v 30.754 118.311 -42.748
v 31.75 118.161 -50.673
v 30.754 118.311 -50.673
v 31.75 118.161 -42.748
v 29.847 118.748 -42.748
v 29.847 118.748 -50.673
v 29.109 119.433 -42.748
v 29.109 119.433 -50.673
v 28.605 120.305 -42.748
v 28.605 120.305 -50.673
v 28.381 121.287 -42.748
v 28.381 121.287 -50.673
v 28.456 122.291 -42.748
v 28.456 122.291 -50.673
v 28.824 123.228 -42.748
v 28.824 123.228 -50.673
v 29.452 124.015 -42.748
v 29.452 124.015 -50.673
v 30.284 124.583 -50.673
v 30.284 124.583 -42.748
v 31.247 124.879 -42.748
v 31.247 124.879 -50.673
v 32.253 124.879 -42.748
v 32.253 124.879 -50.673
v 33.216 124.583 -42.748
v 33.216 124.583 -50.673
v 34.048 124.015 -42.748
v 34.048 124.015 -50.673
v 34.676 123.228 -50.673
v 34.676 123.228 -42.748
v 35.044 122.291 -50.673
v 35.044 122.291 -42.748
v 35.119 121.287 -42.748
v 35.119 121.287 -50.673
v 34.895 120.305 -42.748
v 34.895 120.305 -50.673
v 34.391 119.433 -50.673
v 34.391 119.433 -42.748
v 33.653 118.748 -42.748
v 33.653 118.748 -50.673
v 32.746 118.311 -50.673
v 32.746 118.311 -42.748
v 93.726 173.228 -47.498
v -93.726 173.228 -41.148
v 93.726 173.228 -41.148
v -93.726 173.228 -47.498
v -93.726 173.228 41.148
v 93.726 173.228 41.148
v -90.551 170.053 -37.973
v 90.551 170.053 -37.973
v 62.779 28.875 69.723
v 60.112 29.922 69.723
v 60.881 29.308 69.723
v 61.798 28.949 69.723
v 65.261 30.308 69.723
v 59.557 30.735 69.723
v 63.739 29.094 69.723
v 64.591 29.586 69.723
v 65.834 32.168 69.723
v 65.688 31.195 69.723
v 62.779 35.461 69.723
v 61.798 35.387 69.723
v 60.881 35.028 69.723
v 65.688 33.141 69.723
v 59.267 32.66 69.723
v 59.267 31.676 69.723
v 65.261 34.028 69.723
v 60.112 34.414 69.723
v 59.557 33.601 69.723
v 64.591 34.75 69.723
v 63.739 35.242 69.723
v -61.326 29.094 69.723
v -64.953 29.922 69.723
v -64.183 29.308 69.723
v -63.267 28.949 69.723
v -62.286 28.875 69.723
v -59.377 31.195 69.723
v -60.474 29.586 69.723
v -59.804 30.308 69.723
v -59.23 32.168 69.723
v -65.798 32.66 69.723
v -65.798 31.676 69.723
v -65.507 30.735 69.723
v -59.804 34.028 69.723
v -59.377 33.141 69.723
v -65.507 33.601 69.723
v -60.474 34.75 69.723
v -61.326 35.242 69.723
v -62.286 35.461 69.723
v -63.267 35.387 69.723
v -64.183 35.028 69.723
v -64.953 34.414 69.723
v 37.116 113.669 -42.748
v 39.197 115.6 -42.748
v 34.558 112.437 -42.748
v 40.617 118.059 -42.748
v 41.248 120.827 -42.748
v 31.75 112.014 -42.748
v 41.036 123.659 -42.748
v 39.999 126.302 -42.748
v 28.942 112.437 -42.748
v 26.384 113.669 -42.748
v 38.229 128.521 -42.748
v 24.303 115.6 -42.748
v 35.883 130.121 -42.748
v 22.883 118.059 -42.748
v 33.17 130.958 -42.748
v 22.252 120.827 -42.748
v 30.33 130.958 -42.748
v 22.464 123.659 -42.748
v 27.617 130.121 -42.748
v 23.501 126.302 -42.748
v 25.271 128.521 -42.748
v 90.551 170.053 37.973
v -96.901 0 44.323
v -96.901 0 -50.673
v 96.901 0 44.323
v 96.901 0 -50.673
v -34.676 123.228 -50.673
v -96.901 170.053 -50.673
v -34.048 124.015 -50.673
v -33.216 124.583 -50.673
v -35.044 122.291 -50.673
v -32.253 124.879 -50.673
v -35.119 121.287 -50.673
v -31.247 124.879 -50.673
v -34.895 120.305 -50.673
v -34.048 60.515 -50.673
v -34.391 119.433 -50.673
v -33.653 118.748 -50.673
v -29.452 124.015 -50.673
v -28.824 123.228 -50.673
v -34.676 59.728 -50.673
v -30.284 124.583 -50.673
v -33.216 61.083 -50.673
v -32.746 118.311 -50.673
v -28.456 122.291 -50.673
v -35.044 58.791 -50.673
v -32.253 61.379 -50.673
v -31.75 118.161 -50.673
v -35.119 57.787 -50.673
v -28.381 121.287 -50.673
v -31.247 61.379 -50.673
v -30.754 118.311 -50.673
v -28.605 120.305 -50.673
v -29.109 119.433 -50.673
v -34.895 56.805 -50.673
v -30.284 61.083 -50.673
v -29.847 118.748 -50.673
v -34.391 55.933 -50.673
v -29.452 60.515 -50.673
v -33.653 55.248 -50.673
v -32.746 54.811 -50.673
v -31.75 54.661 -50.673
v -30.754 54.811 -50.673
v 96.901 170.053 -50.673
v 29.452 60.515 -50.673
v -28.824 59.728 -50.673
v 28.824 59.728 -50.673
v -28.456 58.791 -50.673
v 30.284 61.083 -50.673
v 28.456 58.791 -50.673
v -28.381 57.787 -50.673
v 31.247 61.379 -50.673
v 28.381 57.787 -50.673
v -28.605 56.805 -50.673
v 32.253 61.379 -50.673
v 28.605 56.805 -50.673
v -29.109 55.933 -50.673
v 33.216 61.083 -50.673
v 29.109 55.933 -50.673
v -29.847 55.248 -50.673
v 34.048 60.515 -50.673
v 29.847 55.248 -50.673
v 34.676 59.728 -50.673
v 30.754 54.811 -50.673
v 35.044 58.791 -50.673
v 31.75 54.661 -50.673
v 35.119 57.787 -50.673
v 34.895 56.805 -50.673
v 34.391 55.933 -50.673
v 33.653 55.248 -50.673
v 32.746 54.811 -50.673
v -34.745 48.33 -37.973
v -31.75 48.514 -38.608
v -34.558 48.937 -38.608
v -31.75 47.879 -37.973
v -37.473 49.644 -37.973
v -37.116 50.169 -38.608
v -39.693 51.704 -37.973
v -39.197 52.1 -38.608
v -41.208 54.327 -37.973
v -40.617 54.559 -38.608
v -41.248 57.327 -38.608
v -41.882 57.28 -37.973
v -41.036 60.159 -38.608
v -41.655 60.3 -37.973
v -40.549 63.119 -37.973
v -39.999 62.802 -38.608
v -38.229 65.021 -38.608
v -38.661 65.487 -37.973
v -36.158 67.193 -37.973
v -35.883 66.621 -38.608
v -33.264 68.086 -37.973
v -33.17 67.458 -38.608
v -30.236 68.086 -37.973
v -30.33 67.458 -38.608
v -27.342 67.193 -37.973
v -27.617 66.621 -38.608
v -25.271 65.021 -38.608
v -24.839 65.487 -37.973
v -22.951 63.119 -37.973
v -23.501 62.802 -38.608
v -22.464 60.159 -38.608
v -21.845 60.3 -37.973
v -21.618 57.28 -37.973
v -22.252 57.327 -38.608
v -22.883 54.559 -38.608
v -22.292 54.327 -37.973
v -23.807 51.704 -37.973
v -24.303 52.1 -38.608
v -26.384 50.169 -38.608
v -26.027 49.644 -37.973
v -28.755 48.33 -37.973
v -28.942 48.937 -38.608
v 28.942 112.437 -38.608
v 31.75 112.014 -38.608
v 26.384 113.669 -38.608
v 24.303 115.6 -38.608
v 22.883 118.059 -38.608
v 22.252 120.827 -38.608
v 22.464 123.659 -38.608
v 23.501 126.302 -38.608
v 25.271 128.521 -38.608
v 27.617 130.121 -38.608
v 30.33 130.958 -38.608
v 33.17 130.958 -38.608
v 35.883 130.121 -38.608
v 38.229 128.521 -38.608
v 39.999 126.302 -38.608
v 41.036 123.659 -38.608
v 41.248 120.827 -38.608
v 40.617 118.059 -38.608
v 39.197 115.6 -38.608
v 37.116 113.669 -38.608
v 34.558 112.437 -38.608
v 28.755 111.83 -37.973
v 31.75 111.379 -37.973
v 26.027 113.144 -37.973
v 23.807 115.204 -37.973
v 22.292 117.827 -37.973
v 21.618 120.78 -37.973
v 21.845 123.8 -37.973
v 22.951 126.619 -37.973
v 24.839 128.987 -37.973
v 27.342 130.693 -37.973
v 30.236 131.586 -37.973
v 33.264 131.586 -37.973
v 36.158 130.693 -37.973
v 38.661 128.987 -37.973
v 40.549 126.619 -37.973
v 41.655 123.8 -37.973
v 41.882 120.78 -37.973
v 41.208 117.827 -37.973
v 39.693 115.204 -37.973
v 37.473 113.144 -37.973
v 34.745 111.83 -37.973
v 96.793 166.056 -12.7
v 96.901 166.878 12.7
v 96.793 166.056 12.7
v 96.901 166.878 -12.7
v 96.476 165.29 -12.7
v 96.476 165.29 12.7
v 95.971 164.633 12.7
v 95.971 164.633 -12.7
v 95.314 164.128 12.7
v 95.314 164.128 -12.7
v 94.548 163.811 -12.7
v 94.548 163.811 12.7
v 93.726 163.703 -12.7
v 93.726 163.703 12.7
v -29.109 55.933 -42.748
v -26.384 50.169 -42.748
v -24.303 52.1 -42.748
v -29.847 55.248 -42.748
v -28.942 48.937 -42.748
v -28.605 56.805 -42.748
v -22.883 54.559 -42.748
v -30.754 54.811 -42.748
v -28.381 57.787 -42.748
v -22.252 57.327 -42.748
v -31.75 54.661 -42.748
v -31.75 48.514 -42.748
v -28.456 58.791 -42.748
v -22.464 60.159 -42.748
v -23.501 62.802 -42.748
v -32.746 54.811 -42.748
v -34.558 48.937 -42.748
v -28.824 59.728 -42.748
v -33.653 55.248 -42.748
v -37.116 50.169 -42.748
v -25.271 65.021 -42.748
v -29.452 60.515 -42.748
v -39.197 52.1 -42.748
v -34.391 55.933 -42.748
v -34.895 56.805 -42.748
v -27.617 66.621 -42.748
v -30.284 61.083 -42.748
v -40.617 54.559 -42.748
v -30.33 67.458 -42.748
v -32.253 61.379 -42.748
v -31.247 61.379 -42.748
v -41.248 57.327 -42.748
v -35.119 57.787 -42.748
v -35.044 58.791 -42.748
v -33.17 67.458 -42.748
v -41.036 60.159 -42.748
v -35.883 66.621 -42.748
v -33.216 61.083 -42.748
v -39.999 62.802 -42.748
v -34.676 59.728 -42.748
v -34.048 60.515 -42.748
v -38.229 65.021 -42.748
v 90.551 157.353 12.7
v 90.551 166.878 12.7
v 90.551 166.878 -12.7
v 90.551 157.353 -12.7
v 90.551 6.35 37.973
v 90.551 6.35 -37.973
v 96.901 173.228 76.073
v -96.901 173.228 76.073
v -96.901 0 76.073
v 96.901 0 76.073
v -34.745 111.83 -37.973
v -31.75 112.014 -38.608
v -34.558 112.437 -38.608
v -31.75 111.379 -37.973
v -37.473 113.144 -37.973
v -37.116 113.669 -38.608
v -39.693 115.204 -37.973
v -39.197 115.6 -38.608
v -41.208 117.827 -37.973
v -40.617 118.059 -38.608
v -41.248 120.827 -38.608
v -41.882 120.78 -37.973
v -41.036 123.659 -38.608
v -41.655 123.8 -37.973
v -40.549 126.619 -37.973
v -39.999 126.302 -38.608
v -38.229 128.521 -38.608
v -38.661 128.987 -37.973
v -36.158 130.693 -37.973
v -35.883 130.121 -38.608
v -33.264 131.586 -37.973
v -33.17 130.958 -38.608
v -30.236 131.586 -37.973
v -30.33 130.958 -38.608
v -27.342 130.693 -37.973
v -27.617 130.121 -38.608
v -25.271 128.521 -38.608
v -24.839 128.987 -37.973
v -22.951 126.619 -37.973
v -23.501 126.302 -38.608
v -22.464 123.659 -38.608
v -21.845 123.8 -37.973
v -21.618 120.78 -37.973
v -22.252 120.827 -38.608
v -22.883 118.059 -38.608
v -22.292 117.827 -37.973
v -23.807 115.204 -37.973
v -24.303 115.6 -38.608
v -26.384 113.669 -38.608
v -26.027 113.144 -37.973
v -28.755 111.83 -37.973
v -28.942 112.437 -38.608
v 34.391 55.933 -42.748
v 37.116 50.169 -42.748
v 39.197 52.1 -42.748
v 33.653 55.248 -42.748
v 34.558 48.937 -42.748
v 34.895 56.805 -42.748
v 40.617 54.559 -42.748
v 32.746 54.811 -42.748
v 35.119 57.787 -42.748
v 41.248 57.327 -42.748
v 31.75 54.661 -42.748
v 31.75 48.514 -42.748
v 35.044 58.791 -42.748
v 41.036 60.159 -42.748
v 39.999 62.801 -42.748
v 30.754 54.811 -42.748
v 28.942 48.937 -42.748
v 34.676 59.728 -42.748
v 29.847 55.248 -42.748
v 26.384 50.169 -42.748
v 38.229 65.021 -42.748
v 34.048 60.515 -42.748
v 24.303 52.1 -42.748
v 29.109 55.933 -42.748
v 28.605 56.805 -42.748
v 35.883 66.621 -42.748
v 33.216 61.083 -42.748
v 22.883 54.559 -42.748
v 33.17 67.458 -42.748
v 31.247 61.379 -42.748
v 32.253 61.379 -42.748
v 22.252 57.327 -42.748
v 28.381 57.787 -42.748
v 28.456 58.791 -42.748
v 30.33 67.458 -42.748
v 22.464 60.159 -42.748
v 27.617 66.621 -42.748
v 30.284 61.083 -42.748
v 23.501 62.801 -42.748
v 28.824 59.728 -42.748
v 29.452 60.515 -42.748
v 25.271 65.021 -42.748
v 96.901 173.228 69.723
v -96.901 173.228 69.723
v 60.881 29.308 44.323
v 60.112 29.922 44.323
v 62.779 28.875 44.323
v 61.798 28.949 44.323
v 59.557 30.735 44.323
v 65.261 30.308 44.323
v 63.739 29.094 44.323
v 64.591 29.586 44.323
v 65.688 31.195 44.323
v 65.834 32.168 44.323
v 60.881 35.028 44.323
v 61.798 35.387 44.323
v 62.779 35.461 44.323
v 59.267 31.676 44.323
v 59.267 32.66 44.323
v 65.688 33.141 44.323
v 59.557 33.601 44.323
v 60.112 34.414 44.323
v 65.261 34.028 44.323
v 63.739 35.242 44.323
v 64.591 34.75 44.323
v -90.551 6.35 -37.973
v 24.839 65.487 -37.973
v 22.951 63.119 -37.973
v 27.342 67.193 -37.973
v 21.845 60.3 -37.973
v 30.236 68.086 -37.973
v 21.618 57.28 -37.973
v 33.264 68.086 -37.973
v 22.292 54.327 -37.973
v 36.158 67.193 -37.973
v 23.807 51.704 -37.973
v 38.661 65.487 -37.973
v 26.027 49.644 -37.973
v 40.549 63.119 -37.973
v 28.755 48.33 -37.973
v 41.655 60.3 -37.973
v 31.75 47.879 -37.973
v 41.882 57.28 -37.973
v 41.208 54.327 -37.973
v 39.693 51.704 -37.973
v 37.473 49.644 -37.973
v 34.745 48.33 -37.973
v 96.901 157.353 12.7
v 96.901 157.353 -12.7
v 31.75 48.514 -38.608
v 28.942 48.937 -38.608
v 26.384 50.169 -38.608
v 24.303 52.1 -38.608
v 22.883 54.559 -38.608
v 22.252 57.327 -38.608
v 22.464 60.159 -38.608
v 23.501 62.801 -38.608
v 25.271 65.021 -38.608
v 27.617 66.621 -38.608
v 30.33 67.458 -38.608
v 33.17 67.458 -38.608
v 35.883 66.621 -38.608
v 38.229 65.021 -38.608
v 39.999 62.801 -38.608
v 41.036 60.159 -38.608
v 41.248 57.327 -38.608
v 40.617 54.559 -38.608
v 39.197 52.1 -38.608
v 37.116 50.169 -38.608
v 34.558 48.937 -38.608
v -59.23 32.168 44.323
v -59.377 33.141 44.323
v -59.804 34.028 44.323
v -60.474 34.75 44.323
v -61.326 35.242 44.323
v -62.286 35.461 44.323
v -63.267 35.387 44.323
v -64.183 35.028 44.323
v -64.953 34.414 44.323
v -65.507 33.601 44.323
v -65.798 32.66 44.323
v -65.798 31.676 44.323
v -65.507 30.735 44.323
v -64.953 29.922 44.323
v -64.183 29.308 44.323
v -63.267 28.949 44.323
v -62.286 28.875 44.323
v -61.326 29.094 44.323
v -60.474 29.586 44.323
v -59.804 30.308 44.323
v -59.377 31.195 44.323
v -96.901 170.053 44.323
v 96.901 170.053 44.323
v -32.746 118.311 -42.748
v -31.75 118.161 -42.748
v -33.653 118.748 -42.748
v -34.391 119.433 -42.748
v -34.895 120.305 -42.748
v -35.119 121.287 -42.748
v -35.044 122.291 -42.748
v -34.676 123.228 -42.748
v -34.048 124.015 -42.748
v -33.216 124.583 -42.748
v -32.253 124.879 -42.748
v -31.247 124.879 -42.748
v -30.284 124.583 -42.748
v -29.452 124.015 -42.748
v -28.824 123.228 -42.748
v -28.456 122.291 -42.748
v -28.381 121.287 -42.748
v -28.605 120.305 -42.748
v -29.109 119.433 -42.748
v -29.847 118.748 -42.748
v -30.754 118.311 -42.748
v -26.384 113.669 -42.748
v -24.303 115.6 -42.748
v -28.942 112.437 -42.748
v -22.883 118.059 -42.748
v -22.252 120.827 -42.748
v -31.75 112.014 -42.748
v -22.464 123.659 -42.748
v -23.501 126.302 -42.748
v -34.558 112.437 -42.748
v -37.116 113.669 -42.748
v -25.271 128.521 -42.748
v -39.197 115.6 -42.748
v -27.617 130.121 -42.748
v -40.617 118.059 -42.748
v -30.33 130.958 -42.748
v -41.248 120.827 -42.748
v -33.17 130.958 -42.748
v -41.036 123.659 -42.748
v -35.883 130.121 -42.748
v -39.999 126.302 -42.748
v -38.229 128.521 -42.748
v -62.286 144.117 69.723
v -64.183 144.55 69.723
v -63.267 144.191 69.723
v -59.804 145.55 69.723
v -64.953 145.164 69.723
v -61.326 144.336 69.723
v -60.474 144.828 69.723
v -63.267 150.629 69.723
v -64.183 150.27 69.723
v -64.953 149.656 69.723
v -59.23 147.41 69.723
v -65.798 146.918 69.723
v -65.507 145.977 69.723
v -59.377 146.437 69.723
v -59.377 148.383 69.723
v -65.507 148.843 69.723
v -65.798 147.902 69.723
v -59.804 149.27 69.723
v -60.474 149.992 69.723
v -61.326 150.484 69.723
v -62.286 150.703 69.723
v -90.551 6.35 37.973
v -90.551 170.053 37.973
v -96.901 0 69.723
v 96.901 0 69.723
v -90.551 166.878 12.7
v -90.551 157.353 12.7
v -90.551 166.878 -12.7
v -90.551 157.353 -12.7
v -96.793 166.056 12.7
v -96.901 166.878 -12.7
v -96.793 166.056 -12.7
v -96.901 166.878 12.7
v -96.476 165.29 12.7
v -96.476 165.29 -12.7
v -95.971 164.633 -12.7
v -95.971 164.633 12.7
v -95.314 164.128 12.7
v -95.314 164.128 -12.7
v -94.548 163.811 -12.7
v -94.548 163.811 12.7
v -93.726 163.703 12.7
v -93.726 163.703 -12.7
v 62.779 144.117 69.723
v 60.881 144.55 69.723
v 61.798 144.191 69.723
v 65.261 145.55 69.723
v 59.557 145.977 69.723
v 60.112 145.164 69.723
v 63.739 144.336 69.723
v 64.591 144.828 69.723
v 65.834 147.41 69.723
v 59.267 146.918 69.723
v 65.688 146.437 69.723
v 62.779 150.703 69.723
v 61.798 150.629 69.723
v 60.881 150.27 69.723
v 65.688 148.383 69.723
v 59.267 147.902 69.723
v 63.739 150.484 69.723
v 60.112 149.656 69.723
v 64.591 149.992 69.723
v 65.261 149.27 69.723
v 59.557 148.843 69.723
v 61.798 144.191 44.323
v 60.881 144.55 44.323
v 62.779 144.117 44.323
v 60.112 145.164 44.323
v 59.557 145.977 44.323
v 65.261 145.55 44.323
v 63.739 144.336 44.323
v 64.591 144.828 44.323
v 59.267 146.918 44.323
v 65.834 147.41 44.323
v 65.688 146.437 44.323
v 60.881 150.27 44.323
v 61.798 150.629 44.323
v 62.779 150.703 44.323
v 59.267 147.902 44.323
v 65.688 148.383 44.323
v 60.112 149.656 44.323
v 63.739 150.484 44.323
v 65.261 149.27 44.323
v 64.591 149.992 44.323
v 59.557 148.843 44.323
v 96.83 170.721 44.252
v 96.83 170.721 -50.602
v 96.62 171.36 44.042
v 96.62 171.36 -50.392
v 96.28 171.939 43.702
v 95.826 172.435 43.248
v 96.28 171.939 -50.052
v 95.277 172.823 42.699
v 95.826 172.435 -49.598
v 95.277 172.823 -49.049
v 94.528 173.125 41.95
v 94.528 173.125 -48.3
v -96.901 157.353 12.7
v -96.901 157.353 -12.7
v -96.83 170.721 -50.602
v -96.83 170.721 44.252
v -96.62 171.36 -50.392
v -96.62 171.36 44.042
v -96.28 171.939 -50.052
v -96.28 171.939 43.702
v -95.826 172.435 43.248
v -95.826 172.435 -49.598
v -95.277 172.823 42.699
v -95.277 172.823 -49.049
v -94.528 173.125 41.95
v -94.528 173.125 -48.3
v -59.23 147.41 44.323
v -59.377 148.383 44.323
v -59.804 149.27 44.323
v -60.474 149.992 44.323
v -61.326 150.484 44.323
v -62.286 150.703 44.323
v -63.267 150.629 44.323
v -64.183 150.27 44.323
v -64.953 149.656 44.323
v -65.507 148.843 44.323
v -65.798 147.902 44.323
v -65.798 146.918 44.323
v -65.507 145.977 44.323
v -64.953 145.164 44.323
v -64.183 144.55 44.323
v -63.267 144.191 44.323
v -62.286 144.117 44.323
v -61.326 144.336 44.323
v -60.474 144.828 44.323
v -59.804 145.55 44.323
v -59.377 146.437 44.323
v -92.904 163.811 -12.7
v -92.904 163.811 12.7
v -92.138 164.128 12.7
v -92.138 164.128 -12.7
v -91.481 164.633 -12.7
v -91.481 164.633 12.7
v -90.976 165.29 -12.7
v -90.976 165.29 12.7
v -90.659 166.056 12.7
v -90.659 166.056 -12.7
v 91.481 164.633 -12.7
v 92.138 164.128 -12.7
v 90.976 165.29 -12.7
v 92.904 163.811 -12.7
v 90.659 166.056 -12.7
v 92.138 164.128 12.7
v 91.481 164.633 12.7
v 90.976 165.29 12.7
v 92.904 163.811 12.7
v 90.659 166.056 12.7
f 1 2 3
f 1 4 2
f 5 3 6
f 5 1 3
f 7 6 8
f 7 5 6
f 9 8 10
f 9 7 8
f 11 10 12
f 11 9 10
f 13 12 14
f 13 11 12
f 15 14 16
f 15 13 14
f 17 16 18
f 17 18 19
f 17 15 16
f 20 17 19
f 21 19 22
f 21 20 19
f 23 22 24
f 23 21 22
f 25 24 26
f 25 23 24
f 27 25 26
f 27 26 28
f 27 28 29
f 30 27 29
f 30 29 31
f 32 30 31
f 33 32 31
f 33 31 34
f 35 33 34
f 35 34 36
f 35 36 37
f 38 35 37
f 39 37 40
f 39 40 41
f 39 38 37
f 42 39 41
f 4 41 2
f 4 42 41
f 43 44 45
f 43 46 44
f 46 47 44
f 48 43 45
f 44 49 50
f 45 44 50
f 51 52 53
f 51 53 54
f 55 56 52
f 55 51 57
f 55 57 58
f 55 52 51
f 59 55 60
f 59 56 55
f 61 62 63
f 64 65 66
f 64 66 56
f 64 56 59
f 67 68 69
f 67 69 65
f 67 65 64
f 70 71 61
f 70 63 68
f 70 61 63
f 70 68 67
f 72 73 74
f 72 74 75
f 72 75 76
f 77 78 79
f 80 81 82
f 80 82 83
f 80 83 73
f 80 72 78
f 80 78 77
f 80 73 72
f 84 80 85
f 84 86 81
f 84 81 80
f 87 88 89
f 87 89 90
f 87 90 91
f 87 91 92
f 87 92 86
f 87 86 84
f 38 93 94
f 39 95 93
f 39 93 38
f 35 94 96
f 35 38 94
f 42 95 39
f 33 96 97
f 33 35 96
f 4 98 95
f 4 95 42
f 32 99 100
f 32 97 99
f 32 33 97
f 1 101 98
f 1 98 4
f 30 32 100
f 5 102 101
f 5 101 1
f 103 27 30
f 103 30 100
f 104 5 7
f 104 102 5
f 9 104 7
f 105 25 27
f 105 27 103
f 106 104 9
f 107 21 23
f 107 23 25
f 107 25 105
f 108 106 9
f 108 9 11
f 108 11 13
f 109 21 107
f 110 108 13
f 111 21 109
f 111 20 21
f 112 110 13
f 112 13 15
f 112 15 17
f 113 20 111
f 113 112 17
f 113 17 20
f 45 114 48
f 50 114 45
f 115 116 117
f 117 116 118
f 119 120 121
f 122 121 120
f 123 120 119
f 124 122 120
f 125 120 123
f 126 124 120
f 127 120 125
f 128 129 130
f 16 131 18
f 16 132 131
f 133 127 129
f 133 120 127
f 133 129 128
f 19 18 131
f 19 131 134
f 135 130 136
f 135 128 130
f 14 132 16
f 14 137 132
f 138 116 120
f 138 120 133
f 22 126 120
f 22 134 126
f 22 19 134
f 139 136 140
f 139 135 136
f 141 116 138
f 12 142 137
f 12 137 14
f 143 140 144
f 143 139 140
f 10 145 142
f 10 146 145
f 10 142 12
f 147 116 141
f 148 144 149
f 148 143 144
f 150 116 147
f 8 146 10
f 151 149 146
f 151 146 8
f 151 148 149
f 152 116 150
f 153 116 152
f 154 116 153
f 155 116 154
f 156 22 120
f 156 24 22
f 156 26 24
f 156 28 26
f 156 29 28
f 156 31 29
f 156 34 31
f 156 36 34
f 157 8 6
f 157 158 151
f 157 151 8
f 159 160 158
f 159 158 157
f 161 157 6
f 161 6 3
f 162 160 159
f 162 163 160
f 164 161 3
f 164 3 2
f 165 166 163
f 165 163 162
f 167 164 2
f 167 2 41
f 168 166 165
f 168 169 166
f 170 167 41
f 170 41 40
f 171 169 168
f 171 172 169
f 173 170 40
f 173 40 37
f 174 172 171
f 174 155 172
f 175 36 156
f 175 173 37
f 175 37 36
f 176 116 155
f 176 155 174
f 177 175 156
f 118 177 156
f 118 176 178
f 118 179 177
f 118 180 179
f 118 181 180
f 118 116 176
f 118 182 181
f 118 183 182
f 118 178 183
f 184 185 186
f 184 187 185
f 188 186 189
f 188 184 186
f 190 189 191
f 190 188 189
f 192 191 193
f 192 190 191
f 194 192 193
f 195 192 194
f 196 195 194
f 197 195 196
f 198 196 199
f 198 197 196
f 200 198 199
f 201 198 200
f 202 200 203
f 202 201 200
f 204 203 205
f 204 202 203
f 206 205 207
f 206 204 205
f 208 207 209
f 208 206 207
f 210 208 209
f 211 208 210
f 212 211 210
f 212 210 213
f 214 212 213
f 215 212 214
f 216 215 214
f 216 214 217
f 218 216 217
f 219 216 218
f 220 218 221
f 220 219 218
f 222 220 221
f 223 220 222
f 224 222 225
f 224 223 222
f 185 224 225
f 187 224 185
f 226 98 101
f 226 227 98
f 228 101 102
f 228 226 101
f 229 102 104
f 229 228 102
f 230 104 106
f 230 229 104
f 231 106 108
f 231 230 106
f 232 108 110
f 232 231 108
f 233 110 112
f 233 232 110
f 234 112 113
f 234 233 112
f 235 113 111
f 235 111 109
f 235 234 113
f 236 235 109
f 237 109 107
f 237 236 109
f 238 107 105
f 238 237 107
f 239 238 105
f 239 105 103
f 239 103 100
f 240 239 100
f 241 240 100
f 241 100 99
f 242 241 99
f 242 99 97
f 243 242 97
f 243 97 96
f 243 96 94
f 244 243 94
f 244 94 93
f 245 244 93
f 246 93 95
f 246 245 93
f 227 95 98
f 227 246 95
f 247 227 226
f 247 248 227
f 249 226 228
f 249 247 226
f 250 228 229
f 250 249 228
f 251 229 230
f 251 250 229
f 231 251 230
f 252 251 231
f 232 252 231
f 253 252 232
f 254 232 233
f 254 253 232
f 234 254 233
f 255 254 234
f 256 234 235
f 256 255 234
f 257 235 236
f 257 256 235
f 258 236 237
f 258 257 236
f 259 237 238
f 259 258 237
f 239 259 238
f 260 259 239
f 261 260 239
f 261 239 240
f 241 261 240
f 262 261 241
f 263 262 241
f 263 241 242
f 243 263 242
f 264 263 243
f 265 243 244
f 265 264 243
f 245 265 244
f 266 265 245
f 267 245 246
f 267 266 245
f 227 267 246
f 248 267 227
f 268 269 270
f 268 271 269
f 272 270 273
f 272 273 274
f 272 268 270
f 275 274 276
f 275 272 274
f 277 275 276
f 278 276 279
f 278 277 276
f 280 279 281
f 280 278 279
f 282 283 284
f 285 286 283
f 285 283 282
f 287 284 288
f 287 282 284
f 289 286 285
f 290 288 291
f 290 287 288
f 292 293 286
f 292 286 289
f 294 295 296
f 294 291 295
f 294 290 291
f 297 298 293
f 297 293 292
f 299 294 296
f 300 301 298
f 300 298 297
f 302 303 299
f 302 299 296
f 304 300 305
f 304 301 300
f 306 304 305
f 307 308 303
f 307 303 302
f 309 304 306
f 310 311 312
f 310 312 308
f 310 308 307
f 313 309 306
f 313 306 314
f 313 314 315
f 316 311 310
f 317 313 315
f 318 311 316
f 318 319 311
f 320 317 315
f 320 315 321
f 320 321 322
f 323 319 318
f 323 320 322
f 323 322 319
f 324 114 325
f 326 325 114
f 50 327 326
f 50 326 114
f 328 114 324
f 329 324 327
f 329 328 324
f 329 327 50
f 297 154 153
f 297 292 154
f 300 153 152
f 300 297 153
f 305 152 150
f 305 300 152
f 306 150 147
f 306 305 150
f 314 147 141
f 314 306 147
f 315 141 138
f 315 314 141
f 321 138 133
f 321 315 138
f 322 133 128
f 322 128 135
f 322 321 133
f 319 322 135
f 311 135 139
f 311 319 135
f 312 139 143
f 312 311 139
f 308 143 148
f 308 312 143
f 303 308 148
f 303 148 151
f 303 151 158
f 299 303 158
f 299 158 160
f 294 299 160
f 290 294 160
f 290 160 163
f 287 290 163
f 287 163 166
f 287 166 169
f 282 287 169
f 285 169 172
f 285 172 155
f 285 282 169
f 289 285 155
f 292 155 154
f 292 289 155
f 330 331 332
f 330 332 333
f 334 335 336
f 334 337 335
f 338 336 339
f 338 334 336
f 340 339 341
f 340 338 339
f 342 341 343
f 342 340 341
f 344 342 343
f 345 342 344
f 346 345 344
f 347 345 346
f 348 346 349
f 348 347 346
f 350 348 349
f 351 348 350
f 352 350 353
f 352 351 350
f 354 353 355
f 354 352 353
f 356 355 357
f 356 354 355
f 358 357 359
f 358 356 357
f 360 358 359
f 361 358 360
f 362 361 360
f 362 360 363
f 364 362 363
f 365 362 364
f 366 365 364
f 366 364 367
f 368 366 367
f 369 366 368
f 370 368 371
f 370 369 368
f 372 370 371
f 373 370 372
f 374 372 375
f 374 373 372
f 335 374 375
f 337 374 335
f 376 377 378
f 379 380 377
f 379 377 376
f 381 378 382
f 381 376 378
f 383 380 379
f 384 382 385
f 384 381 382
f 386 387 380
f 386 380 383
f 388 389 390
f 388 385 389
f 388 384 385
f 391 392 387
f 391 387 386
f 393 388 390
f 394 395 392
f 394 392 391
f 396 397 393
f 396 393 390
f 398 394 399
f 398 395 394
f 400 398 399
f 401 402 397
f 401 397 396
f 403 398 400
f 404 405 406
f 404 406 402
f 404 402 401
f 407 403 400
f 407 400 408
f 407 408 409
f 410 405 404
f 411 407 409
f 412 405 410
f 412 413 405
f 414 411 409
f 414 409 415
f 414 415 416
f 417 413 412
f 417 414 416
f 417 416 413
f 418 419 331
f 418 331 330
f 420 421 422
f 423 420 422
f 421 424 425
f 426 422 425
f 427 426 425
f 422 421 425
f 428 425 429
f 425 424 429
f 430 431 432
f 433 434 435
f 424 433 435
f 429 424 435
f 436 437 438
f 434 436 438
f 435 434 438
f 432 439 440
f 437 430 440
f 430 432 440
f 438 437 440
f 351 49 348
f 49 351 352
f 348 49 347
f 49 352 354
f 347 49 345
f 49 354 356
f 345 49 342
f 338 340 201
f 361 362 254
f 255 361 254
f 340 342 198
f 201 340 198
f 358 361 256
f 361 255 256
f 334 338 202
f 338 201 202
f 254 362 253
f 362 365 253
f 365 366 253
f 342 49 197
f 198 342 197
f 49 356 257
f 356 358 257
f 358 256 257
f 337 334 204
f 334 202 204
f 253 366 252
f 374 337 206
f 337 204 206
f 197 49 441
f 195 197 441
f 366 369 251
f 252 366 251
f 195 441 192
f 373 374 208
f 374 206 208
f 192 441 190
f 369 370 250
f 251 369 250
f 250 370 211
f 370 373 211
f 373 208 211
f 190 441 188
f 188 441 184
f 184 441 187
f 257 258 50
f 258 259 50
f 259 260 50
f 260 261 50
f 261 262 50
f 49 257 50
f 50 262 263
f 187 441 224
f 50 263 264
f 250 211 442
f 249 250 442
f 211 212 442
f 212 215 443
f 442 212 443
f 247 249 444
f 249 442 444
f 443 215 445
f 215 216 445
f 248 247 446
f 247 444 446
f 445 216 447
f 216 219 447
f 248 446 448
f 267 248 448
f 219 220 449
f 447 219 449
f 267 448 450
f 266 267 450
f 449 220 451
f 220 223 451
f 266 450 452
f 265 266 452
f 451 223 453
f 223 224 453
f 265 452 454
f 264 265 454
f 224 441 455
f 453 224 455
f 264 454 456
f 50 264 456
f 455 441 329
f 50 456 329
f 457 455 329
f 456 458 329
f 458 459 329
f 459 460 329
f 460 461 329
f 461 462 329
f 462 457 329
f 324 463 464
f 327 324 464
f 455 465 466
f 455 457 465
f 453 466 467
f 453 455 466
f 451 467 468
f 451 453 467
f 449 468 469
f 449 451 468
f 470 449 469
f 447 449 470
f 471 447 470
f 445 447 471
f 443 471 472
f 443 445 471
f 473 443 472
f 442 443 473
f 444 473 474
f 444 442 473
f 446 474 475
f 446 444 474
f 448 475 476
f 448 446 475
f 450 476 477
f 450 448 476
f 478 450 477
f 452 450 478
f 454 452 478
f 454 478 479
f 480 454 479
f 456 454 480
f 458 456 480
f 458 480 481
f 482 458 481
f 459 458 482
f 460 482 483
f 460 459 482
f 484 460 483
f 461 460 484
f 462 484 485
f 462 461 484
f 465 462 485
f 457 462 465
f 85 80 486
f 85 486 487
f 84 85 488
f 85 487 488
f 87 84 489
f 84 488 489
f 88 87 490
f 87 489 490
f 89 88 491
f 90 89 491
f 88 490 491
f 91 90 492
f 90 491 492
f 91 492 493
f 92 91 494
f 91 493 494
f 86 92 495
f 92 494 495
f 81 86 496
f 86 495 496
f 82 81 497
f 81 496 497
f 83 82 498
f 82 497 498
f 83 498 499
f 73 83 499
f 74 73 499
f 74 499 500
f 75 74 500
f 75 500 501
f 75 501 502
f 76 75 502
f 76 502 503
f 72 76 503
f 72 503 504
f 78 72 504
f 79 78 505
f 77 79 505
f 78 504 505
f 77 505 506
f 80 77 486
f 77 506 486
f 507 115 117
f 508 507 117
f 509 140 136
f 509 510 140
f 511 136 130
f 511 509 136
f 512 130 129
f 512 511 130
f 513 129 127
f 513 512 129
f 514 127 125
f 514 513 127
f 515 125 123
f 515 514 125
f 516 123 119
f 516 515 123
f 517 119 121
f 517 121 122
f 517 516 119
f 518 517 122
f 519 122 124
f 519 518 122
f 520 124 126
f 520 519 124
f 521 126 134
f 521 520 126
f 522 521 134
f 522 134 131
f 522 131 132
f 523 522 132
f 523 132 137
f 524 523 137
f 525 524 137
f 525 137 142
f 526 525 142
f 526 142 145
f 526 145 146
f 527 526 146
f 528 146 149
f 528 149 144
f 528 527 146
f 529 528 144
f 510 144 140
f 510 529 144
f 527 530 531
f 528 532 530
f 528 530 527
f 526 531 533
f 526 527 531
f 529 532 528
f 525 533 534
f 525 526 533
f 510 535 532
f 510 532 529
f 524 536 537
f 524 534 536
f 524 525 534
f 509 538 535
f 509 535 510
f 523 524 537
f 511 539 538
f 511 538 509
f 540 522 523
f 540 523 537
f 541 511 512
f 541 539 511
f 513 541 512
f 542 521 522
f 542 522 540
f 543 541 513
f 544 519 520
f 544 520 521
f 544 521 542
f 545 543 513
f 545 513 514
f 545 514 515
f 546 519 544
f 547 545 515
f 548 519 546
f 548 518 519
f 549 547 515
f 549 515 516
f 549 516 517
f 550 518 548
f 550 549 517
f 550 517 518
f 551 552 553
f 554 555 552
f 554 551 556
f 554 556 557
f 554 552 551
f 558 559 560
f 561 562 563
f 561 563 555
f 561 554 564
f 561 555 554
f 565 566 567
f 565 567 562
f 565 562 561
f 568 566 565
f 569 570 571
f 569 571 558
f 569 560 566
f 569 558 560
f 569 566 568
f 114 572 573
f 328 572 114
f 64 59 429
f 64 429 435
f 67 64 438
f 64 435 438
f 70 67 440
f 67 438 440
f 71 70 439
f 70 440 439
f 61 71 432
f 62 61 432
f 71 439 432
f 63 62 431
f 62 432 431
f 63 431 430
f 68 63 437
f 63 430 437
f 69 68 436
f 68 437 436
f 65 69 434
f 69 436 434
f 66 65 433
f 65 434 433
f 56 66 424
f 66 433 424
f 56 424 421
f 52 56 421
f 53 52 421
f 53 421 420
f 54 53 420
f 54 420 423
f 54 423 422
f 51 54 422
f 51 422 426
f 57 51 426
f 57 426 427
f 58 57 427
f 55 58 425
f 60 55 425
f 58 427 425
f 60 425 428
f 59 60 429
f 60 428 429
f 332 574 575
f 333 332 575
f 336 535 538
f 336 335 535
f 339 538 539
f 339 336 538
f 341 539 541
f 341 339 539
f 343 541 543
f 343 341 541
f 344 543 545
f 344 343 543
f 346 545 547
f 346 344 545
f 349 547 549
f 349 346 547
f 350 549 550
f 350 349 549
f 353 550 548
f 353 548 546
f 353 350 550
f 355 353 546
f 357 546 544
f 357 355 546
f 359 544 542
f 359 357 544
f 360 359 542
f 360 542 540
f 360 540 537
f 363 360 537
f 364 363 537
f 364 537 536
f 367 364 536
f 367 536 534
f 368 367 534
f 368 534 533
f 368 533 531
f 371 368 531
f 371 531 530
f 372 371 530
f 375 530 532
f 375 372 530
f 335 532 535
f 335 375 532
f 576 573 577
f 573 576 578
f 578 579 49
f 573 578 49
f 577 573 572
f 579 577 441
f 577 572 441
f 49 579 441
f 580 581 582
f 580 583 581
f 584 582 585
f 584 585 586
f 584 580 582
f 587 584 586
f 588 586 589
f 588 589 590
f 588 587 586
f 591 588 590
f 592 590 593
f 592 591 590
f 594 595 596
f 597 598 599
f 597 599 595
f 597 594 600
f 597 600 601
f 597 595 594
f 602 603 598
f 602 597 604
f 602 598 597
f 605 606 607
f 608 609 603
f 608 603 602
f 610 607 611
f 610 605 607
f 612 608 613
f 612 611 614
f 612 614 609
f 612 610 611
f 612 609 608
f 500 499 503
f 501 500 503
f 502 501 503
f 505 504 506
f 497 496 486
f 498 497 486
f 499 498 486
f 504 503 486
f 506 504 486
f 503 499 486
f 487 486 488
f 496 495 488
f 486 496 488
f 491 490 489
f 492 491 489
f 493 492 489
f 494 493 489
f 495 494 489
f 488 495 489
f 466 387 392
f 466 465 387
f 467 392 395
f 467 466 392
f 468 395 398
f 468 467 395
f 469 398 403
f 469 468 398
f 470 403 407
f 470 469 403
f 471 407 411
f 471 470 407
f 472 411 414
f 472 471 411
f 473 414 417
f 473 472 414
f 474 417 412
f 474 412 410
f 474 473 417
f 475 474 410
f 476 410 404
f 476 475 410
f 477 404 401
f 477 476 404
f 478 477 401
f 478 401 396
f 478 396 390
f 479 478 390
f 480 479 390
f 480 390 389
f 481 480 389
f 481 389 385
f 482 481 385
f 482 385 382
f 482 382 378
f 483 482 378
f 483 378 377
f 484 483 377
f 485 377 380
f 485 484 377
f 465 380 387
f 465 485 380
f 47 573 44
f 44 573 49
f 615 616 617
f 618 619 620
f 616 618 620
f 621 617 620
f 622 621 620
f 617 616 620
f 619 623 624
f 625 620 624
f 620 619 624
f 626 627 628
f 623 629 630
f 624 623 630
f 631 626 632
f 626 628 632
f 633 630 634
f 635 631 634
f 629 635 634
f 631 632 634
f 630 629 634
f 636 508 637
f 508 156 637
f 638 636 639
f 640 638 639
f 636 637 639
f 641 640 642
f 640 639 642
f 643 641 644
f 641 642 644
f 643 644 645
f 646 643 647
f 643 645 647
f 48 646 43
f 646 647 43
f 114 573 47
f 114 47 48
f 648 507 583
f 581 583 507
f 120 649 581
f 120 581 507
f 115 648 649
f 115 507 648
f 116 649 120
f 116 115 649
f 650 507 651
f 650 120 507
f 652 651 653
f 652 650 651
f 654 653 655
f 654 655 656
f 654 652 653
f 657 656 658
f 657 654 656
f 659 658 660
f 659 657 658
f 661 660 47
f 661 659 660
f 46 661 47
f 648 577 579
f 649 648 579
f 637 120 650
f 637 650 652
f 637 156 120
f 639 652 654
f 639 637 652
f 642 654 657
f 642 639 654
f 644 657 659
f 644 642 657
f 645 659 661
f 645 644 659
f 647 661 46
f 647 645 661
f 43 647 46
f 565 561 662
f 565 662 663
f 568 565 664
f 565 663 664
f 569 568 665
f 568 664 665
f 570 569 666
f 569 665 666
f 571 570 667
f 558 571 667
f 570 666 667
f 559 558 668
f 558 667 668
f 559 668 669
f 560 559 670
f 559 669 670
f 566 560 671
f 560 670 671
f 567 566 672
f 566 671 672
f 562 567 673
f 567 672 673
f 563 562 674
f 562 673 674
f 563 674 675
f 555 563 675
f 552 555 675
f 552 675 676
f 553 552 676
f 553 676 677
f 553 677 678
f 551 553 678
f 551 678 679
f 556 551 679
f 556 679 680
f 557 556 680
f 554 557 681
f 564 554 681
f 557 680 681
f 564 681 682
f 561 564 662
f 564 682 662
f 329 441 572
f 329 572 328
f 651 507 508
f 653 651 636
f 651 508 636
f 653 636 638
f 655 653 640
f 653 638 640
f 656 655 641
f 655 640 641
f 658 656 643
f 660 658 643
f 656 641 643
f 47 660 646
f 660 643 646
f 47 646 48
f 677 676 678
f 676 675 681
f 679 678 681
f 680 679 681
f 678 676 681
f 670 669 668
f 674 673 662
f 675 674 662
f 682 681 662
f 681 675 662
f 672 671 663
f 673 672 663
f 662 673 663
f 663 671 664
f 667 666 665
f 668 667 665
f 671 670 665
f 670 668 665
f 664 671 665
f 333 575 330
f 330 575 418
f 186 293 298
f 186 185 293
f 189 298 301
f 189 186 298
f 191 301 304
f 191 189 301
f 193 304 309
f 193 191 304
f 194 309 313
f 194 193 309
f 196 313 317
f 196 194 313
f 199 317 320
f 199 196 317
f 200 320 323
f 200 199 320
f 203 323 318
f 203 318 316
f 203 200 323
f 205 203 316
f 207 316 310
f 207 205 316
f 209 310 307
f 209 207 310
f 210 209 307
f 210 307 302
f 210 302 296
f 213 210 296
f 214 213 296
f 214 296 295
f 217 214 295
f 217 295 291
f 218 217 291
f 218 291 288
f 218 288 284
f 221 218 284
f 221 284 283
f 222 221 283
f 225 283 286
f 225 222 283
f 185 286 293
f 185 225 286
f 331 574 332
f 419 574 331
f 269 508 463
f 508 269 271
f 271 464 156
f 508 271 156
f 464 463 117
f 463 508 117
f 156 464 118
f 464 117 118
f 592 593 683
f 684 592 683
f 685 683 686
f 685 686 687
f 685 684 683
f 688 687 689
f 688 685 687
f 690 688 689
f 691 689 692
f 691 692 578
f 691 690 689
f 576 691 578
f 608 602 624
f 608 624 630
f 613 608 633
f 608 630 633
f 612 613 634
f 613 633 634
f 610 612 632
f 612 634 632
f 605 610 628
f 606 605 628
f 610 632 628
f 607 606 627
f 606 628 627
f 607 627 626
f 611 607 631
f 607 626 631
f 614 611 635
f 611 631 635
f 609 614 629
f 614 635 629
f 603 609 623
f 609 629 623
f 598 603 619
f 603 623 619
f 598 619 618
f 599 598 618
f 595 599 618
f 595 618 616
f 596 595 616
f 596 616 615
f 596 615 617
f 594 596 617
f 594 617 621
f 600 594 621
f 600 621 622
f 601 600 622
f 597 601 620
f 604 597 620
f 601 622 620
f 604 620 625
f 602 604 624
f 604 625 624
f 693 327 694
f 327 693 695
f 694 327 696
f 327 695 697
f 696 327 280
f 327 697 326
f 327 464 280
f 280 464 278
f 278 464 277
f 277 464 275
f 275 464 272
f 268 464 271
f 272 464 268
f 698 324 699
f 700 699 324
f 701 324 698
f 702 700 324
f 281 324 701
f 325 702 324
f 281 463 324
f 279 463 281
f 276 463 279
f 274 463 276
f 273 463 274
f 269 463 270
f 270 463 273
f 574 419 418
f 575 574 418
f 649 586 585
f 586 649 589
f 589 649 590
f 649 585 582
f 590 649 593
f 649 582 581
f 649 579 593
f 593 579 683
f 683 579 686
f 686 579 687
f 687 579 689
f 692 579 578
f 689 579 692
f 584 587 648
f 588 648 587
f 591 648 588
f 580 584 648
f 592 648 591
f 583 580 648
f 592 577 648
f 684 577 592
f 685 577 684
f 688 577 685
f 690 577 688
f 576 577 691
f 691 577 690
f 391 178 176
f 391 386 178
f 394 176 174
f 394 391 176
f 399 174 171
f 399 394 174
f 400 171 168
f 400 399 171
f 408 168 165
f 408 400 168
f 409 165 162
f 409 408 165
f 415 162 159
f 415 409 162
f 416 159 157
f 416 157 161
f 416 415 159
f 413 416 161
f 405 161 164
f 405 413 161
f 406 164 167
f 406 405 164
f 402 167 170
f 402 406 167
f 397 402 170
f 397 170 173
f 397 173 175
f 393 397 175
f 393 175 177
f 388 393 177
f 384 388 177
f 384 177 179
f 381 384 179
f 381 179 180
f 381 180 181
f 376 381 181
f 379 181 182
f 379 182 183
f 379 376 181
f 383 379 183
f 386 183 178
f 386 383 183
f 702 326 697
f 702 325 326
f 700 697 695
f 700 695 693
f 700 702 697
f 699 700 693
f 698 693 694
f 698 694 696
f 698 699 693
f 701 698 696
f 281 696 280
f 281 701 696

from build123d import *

# Parameters (mm, degrees)
SKETCH2_W                               = 193.802
SKETCH2_H                               = 94.996
BOSS_EXTRUDE1_DEPTH                     = 6.35
BOSS_EXTRUDE2_START                     = 6.35
SKETCH2_3_W                             = 193.802
SKETCH2_3_H                             = 94.996
SKETCH2_3_W_2                           = 181.102
SKETCH2_3_H_2                           = 75.946
BOSS_EXTRUDE2_DEPTH                     = 166.878
CBORE_FOR_1_4_HEX_HEAD_BOLT2_AT_2_COUNT = 2
CBORE_FOR_1_4_HEX_HEAD_BOLT2_AT_2_PITCH = 63.5
CBORE_FOR_1_4_HEX_HEAD_BOLT2_AT_3_COUNT = 2
CBORE_FOR_1_4_HEX_HEAD_BOLT2_AT_3_PITCH = 89.802561211
CBORE_FOR_1_4_HEX_HEAD_BOLT2_AT_4_COUNT = 2
CBORE_FOR_1_4_HEX_HEAD_BOLT2_AT_4_PITCH = 63.5
SKETCH12_R                              = 3.302
BOSS_EXTRUDE3_DEPTH                     = 25.4
BOSS_EXTRUDE3_2_DEPTH                   = 25.4
BOSS_EXTRUDE3_3_DEPTH                   = 25.4
BOSS_EXTRUDE3_4_DEPTH                   = 25.4
BOSS_EXTRUDE4_START                     = 25.4
SKETCH13_W                              = 193.802
SKETCH13_H                              = 173.228
BOSS_EXTRUDE4_DEPTH                     = 6.35
SKETCH16_W                              = 25.4
SKETCH16_H                              = 6.35
CUT_EXTRUDE2_DEPTH                      = 271.839909387
FILLET1_R                               = 3.175
FILLET2_R                               = 3.175
CHAMFER1_SIZE                           = 3.175


with BuildPart() as part:
    # Sketch2 → Boss-Extrude1 (new body)
    with BuildSketch(Plane(origin=(0, 0, 0), x_dir=(1, 0, 0), z_dir=(0, 1, 0))):
        with Locations((0, 3.175)):
            Rectangle(SKETCH2_W, SKETCH2_H)
    extrude(amount=BOSS_EXTRUDE1_DEPTH)

    # Sketch2<3> → Boss-Extrude2 (add)
    with BuildSketch(Plane(origin=(0, 0, 0), x_dir=(1, 0, 0), z_dir=(0, 1, 0)).offset(BOSS_EXTRUDE2_START)):
        with Locations((0, 3.175)):
            Rectangle(SKETCH2_3_W, SKETCH2_3_H)
        Rectangle(SKETCH2_3_W_2, SKETCH2_3_H_2, mode=Mode.SUBTRACT)
    extrude(amount=BOSS_EXTRUDE2_DEPTH)

    # Sketch8 → CBORE for 1/4 Hex Head Bolt2 (revolve, cut)
    with BuildSketch(Plane(origin=(-31.75, 121.539, -37.973), x_dir=(0, -1, 0), z_dir=(1, 0, 0))):
        Polygon((0, 0), (0, 12.7), (3.3782, 12.7), (3.3782, 4.7752), (9.525, 4.7752), (9.525, 0.635), (10.16, 0), align=None)
    cbore_for_1_4_hex_head_bolt2 = revolve(axis=Axis((-31.75, 121.539, -31.623), (0, 0, -1)), mode=Mode.SUBTRACT)

    # CBORE for 1/4 Hex Head Bolt2 at 2: CBORE for 1/4 Hex Head Bolt2 ×2
    with Locations(*[(i * CBORE_FOR_1_4_HEX_HEAD_BOLT2_AT_2_PITCH, 0, 0) for i in range(1, CBORE_FOR_1_4_HEX_HEAD_BOLT2_AT_2_COUNT)]):
        add(cbore_for_1_4_hex_head_bolt2, mode=Mode.SUBTRACT)

    # CBORE for 1/4 Hex Head Bolt2 at 3: CBORE for 1/4 Hex Head Bolt2 ×2
    with Locations(*[Vector(0.7071067811865476, -0.7071067811865475, 0) * (i * CBORE_FOR_1_4_HEX_HEAD_BOLT2_AT_3_PITCH) for i in range(1, CBORE_FOR_1_4_HEX_HEAD_BOLT2_AT_3_COUNT)]):
        add(cbore_for_1_4_hex_head_bolt2, mode=Mode.SUBTRACT)

    # CBORE for 1/4 Hex Head Bolt2 at 4: CBORE for 1/4 Hex Head Bolt2 ×2
    with Locations(*[(0, -i * CBORE_FOR_1_4_HEX_HEAD_BOLT2_AT_4_PITCH, 0) for i in range(1, CBORE_FOR_1_4_HEX_HEAD_BOLT2_AT_4_COUNT)]):
        add(cbore_for_1_4_hex_head_bolt2, mode=Mode.SUBTRACT)

    # Sketch16 → Cut-Extrude2 (cut, through all)
    with BuildSketch(Plane(origin=(96.901, 0, 0), x_dir=(0, 0, -1), z_dir=(1, 0, 0))):
        with Locations((0, 160.528)):
            Rectangle(SKETCH16_W, SKETCH16_H)
    extrude(amount=-CUT_EXTRUDE2_DEPTH, mode=Mode.SUBTRACT)

    # Fillet1
    fillet1_edges = [part.edges().sort_by_distance(p)[0] for p in [
        (90.551, 163.703, 0),
        (96.901, 163.703, 0),
        (-90.551, 163.703, 0),
        (-96.901, 163.703, 0),
    ]]
    fillet(fillet1_edges, radius=FILLET1_R - 0.0001)  # a hair under: the kernel refuses the full size

    # Fillet2
    fillet2_edges = [part.edges().sort_by_distance(p)[0] for p in [
        (0, 173.228, -50.673),
        (-96.901, 173.228, -3.175),
        (0, 173.228, 44.323),
        (96.901, 173.228, -3.175),
    ]]
    fillet(fillet2_edges, radius=FILLET2_R)

    # Chamfer1
    chamfer1_edges = [part.edges().sort_by_distance(p)[0] for p in [
        (-90.551, 173.228, 0),
        (0, 173.228, -37.973),
        (90.551, 173.228, 0),
        (0, 173.228, 37.973),
    ]]
    chamfer(chamfer1_edges, length=CHAMFER1_SIZE - 0.0001)  # a hair under: the kernel refuses the full size


with BuildPart() as body_2:
    # Sketch12 → Boss-Extrude3 (new body)
    with BuildSketch(Plane.XY.offset(44.323)):
        with Locations((-62.532400681, 147.410019982)):
            Circle(SKETCH12_R)
    extrude(amount=BOSS_EXTRUDE3_DEPTH)


with BuildPart() as body_3:
    # Sketch12 → Boss-Extrude3 2 (new body)
    with BuildSketch(Plane.XY.offset(44.323)):
        with Locations((62.532400681, 147.410019982)):
            Circle(SKETCH12_R)
    extrude(amount=BOSS_EXTRUDE3_2_DEPTH)


with BuildPart() as body_4:
    # Sketch12 → Boss-Extrude3 3 (new body)
    with BuildSketch(Plane.XY.offset(44.323)):
        with Locations((62.532400681, 32.167980018)):
            Circle(SKETCH12_R)
    extrude(amount=BOSS_EXTRUDE3_3_DEPTH)


with BuildPart() as body_5:
    # Sketch12 → Boss-Extrude3 4 (new body)
    with BuildSketch(Plane.XY.offset(44.323)):
        with Locations((-62.532400681, 32.167980018)):
            Circle(SKETCH12_R)
    extrude(amount=BOSS_EXTRUDE3_4_DEPTH)


with BuildPart() as body_6:
    # Sketch13 → Boss-Extrude4 (new body)
    with BuildSketch(Plane.XY.offset(44.323).offset(BOSS_EXTRUDE4_START)):
        with Locations((0, 86.614)):
            Rectangle(SKETCH13_W, SKETCH13_H)
    extrude(amount=BOSS_EXTRUDE4_DEPTH)


solid = Compound([part.part, body_2.part, body_3.part, body_4.part, body_5.part, body_6.part])
